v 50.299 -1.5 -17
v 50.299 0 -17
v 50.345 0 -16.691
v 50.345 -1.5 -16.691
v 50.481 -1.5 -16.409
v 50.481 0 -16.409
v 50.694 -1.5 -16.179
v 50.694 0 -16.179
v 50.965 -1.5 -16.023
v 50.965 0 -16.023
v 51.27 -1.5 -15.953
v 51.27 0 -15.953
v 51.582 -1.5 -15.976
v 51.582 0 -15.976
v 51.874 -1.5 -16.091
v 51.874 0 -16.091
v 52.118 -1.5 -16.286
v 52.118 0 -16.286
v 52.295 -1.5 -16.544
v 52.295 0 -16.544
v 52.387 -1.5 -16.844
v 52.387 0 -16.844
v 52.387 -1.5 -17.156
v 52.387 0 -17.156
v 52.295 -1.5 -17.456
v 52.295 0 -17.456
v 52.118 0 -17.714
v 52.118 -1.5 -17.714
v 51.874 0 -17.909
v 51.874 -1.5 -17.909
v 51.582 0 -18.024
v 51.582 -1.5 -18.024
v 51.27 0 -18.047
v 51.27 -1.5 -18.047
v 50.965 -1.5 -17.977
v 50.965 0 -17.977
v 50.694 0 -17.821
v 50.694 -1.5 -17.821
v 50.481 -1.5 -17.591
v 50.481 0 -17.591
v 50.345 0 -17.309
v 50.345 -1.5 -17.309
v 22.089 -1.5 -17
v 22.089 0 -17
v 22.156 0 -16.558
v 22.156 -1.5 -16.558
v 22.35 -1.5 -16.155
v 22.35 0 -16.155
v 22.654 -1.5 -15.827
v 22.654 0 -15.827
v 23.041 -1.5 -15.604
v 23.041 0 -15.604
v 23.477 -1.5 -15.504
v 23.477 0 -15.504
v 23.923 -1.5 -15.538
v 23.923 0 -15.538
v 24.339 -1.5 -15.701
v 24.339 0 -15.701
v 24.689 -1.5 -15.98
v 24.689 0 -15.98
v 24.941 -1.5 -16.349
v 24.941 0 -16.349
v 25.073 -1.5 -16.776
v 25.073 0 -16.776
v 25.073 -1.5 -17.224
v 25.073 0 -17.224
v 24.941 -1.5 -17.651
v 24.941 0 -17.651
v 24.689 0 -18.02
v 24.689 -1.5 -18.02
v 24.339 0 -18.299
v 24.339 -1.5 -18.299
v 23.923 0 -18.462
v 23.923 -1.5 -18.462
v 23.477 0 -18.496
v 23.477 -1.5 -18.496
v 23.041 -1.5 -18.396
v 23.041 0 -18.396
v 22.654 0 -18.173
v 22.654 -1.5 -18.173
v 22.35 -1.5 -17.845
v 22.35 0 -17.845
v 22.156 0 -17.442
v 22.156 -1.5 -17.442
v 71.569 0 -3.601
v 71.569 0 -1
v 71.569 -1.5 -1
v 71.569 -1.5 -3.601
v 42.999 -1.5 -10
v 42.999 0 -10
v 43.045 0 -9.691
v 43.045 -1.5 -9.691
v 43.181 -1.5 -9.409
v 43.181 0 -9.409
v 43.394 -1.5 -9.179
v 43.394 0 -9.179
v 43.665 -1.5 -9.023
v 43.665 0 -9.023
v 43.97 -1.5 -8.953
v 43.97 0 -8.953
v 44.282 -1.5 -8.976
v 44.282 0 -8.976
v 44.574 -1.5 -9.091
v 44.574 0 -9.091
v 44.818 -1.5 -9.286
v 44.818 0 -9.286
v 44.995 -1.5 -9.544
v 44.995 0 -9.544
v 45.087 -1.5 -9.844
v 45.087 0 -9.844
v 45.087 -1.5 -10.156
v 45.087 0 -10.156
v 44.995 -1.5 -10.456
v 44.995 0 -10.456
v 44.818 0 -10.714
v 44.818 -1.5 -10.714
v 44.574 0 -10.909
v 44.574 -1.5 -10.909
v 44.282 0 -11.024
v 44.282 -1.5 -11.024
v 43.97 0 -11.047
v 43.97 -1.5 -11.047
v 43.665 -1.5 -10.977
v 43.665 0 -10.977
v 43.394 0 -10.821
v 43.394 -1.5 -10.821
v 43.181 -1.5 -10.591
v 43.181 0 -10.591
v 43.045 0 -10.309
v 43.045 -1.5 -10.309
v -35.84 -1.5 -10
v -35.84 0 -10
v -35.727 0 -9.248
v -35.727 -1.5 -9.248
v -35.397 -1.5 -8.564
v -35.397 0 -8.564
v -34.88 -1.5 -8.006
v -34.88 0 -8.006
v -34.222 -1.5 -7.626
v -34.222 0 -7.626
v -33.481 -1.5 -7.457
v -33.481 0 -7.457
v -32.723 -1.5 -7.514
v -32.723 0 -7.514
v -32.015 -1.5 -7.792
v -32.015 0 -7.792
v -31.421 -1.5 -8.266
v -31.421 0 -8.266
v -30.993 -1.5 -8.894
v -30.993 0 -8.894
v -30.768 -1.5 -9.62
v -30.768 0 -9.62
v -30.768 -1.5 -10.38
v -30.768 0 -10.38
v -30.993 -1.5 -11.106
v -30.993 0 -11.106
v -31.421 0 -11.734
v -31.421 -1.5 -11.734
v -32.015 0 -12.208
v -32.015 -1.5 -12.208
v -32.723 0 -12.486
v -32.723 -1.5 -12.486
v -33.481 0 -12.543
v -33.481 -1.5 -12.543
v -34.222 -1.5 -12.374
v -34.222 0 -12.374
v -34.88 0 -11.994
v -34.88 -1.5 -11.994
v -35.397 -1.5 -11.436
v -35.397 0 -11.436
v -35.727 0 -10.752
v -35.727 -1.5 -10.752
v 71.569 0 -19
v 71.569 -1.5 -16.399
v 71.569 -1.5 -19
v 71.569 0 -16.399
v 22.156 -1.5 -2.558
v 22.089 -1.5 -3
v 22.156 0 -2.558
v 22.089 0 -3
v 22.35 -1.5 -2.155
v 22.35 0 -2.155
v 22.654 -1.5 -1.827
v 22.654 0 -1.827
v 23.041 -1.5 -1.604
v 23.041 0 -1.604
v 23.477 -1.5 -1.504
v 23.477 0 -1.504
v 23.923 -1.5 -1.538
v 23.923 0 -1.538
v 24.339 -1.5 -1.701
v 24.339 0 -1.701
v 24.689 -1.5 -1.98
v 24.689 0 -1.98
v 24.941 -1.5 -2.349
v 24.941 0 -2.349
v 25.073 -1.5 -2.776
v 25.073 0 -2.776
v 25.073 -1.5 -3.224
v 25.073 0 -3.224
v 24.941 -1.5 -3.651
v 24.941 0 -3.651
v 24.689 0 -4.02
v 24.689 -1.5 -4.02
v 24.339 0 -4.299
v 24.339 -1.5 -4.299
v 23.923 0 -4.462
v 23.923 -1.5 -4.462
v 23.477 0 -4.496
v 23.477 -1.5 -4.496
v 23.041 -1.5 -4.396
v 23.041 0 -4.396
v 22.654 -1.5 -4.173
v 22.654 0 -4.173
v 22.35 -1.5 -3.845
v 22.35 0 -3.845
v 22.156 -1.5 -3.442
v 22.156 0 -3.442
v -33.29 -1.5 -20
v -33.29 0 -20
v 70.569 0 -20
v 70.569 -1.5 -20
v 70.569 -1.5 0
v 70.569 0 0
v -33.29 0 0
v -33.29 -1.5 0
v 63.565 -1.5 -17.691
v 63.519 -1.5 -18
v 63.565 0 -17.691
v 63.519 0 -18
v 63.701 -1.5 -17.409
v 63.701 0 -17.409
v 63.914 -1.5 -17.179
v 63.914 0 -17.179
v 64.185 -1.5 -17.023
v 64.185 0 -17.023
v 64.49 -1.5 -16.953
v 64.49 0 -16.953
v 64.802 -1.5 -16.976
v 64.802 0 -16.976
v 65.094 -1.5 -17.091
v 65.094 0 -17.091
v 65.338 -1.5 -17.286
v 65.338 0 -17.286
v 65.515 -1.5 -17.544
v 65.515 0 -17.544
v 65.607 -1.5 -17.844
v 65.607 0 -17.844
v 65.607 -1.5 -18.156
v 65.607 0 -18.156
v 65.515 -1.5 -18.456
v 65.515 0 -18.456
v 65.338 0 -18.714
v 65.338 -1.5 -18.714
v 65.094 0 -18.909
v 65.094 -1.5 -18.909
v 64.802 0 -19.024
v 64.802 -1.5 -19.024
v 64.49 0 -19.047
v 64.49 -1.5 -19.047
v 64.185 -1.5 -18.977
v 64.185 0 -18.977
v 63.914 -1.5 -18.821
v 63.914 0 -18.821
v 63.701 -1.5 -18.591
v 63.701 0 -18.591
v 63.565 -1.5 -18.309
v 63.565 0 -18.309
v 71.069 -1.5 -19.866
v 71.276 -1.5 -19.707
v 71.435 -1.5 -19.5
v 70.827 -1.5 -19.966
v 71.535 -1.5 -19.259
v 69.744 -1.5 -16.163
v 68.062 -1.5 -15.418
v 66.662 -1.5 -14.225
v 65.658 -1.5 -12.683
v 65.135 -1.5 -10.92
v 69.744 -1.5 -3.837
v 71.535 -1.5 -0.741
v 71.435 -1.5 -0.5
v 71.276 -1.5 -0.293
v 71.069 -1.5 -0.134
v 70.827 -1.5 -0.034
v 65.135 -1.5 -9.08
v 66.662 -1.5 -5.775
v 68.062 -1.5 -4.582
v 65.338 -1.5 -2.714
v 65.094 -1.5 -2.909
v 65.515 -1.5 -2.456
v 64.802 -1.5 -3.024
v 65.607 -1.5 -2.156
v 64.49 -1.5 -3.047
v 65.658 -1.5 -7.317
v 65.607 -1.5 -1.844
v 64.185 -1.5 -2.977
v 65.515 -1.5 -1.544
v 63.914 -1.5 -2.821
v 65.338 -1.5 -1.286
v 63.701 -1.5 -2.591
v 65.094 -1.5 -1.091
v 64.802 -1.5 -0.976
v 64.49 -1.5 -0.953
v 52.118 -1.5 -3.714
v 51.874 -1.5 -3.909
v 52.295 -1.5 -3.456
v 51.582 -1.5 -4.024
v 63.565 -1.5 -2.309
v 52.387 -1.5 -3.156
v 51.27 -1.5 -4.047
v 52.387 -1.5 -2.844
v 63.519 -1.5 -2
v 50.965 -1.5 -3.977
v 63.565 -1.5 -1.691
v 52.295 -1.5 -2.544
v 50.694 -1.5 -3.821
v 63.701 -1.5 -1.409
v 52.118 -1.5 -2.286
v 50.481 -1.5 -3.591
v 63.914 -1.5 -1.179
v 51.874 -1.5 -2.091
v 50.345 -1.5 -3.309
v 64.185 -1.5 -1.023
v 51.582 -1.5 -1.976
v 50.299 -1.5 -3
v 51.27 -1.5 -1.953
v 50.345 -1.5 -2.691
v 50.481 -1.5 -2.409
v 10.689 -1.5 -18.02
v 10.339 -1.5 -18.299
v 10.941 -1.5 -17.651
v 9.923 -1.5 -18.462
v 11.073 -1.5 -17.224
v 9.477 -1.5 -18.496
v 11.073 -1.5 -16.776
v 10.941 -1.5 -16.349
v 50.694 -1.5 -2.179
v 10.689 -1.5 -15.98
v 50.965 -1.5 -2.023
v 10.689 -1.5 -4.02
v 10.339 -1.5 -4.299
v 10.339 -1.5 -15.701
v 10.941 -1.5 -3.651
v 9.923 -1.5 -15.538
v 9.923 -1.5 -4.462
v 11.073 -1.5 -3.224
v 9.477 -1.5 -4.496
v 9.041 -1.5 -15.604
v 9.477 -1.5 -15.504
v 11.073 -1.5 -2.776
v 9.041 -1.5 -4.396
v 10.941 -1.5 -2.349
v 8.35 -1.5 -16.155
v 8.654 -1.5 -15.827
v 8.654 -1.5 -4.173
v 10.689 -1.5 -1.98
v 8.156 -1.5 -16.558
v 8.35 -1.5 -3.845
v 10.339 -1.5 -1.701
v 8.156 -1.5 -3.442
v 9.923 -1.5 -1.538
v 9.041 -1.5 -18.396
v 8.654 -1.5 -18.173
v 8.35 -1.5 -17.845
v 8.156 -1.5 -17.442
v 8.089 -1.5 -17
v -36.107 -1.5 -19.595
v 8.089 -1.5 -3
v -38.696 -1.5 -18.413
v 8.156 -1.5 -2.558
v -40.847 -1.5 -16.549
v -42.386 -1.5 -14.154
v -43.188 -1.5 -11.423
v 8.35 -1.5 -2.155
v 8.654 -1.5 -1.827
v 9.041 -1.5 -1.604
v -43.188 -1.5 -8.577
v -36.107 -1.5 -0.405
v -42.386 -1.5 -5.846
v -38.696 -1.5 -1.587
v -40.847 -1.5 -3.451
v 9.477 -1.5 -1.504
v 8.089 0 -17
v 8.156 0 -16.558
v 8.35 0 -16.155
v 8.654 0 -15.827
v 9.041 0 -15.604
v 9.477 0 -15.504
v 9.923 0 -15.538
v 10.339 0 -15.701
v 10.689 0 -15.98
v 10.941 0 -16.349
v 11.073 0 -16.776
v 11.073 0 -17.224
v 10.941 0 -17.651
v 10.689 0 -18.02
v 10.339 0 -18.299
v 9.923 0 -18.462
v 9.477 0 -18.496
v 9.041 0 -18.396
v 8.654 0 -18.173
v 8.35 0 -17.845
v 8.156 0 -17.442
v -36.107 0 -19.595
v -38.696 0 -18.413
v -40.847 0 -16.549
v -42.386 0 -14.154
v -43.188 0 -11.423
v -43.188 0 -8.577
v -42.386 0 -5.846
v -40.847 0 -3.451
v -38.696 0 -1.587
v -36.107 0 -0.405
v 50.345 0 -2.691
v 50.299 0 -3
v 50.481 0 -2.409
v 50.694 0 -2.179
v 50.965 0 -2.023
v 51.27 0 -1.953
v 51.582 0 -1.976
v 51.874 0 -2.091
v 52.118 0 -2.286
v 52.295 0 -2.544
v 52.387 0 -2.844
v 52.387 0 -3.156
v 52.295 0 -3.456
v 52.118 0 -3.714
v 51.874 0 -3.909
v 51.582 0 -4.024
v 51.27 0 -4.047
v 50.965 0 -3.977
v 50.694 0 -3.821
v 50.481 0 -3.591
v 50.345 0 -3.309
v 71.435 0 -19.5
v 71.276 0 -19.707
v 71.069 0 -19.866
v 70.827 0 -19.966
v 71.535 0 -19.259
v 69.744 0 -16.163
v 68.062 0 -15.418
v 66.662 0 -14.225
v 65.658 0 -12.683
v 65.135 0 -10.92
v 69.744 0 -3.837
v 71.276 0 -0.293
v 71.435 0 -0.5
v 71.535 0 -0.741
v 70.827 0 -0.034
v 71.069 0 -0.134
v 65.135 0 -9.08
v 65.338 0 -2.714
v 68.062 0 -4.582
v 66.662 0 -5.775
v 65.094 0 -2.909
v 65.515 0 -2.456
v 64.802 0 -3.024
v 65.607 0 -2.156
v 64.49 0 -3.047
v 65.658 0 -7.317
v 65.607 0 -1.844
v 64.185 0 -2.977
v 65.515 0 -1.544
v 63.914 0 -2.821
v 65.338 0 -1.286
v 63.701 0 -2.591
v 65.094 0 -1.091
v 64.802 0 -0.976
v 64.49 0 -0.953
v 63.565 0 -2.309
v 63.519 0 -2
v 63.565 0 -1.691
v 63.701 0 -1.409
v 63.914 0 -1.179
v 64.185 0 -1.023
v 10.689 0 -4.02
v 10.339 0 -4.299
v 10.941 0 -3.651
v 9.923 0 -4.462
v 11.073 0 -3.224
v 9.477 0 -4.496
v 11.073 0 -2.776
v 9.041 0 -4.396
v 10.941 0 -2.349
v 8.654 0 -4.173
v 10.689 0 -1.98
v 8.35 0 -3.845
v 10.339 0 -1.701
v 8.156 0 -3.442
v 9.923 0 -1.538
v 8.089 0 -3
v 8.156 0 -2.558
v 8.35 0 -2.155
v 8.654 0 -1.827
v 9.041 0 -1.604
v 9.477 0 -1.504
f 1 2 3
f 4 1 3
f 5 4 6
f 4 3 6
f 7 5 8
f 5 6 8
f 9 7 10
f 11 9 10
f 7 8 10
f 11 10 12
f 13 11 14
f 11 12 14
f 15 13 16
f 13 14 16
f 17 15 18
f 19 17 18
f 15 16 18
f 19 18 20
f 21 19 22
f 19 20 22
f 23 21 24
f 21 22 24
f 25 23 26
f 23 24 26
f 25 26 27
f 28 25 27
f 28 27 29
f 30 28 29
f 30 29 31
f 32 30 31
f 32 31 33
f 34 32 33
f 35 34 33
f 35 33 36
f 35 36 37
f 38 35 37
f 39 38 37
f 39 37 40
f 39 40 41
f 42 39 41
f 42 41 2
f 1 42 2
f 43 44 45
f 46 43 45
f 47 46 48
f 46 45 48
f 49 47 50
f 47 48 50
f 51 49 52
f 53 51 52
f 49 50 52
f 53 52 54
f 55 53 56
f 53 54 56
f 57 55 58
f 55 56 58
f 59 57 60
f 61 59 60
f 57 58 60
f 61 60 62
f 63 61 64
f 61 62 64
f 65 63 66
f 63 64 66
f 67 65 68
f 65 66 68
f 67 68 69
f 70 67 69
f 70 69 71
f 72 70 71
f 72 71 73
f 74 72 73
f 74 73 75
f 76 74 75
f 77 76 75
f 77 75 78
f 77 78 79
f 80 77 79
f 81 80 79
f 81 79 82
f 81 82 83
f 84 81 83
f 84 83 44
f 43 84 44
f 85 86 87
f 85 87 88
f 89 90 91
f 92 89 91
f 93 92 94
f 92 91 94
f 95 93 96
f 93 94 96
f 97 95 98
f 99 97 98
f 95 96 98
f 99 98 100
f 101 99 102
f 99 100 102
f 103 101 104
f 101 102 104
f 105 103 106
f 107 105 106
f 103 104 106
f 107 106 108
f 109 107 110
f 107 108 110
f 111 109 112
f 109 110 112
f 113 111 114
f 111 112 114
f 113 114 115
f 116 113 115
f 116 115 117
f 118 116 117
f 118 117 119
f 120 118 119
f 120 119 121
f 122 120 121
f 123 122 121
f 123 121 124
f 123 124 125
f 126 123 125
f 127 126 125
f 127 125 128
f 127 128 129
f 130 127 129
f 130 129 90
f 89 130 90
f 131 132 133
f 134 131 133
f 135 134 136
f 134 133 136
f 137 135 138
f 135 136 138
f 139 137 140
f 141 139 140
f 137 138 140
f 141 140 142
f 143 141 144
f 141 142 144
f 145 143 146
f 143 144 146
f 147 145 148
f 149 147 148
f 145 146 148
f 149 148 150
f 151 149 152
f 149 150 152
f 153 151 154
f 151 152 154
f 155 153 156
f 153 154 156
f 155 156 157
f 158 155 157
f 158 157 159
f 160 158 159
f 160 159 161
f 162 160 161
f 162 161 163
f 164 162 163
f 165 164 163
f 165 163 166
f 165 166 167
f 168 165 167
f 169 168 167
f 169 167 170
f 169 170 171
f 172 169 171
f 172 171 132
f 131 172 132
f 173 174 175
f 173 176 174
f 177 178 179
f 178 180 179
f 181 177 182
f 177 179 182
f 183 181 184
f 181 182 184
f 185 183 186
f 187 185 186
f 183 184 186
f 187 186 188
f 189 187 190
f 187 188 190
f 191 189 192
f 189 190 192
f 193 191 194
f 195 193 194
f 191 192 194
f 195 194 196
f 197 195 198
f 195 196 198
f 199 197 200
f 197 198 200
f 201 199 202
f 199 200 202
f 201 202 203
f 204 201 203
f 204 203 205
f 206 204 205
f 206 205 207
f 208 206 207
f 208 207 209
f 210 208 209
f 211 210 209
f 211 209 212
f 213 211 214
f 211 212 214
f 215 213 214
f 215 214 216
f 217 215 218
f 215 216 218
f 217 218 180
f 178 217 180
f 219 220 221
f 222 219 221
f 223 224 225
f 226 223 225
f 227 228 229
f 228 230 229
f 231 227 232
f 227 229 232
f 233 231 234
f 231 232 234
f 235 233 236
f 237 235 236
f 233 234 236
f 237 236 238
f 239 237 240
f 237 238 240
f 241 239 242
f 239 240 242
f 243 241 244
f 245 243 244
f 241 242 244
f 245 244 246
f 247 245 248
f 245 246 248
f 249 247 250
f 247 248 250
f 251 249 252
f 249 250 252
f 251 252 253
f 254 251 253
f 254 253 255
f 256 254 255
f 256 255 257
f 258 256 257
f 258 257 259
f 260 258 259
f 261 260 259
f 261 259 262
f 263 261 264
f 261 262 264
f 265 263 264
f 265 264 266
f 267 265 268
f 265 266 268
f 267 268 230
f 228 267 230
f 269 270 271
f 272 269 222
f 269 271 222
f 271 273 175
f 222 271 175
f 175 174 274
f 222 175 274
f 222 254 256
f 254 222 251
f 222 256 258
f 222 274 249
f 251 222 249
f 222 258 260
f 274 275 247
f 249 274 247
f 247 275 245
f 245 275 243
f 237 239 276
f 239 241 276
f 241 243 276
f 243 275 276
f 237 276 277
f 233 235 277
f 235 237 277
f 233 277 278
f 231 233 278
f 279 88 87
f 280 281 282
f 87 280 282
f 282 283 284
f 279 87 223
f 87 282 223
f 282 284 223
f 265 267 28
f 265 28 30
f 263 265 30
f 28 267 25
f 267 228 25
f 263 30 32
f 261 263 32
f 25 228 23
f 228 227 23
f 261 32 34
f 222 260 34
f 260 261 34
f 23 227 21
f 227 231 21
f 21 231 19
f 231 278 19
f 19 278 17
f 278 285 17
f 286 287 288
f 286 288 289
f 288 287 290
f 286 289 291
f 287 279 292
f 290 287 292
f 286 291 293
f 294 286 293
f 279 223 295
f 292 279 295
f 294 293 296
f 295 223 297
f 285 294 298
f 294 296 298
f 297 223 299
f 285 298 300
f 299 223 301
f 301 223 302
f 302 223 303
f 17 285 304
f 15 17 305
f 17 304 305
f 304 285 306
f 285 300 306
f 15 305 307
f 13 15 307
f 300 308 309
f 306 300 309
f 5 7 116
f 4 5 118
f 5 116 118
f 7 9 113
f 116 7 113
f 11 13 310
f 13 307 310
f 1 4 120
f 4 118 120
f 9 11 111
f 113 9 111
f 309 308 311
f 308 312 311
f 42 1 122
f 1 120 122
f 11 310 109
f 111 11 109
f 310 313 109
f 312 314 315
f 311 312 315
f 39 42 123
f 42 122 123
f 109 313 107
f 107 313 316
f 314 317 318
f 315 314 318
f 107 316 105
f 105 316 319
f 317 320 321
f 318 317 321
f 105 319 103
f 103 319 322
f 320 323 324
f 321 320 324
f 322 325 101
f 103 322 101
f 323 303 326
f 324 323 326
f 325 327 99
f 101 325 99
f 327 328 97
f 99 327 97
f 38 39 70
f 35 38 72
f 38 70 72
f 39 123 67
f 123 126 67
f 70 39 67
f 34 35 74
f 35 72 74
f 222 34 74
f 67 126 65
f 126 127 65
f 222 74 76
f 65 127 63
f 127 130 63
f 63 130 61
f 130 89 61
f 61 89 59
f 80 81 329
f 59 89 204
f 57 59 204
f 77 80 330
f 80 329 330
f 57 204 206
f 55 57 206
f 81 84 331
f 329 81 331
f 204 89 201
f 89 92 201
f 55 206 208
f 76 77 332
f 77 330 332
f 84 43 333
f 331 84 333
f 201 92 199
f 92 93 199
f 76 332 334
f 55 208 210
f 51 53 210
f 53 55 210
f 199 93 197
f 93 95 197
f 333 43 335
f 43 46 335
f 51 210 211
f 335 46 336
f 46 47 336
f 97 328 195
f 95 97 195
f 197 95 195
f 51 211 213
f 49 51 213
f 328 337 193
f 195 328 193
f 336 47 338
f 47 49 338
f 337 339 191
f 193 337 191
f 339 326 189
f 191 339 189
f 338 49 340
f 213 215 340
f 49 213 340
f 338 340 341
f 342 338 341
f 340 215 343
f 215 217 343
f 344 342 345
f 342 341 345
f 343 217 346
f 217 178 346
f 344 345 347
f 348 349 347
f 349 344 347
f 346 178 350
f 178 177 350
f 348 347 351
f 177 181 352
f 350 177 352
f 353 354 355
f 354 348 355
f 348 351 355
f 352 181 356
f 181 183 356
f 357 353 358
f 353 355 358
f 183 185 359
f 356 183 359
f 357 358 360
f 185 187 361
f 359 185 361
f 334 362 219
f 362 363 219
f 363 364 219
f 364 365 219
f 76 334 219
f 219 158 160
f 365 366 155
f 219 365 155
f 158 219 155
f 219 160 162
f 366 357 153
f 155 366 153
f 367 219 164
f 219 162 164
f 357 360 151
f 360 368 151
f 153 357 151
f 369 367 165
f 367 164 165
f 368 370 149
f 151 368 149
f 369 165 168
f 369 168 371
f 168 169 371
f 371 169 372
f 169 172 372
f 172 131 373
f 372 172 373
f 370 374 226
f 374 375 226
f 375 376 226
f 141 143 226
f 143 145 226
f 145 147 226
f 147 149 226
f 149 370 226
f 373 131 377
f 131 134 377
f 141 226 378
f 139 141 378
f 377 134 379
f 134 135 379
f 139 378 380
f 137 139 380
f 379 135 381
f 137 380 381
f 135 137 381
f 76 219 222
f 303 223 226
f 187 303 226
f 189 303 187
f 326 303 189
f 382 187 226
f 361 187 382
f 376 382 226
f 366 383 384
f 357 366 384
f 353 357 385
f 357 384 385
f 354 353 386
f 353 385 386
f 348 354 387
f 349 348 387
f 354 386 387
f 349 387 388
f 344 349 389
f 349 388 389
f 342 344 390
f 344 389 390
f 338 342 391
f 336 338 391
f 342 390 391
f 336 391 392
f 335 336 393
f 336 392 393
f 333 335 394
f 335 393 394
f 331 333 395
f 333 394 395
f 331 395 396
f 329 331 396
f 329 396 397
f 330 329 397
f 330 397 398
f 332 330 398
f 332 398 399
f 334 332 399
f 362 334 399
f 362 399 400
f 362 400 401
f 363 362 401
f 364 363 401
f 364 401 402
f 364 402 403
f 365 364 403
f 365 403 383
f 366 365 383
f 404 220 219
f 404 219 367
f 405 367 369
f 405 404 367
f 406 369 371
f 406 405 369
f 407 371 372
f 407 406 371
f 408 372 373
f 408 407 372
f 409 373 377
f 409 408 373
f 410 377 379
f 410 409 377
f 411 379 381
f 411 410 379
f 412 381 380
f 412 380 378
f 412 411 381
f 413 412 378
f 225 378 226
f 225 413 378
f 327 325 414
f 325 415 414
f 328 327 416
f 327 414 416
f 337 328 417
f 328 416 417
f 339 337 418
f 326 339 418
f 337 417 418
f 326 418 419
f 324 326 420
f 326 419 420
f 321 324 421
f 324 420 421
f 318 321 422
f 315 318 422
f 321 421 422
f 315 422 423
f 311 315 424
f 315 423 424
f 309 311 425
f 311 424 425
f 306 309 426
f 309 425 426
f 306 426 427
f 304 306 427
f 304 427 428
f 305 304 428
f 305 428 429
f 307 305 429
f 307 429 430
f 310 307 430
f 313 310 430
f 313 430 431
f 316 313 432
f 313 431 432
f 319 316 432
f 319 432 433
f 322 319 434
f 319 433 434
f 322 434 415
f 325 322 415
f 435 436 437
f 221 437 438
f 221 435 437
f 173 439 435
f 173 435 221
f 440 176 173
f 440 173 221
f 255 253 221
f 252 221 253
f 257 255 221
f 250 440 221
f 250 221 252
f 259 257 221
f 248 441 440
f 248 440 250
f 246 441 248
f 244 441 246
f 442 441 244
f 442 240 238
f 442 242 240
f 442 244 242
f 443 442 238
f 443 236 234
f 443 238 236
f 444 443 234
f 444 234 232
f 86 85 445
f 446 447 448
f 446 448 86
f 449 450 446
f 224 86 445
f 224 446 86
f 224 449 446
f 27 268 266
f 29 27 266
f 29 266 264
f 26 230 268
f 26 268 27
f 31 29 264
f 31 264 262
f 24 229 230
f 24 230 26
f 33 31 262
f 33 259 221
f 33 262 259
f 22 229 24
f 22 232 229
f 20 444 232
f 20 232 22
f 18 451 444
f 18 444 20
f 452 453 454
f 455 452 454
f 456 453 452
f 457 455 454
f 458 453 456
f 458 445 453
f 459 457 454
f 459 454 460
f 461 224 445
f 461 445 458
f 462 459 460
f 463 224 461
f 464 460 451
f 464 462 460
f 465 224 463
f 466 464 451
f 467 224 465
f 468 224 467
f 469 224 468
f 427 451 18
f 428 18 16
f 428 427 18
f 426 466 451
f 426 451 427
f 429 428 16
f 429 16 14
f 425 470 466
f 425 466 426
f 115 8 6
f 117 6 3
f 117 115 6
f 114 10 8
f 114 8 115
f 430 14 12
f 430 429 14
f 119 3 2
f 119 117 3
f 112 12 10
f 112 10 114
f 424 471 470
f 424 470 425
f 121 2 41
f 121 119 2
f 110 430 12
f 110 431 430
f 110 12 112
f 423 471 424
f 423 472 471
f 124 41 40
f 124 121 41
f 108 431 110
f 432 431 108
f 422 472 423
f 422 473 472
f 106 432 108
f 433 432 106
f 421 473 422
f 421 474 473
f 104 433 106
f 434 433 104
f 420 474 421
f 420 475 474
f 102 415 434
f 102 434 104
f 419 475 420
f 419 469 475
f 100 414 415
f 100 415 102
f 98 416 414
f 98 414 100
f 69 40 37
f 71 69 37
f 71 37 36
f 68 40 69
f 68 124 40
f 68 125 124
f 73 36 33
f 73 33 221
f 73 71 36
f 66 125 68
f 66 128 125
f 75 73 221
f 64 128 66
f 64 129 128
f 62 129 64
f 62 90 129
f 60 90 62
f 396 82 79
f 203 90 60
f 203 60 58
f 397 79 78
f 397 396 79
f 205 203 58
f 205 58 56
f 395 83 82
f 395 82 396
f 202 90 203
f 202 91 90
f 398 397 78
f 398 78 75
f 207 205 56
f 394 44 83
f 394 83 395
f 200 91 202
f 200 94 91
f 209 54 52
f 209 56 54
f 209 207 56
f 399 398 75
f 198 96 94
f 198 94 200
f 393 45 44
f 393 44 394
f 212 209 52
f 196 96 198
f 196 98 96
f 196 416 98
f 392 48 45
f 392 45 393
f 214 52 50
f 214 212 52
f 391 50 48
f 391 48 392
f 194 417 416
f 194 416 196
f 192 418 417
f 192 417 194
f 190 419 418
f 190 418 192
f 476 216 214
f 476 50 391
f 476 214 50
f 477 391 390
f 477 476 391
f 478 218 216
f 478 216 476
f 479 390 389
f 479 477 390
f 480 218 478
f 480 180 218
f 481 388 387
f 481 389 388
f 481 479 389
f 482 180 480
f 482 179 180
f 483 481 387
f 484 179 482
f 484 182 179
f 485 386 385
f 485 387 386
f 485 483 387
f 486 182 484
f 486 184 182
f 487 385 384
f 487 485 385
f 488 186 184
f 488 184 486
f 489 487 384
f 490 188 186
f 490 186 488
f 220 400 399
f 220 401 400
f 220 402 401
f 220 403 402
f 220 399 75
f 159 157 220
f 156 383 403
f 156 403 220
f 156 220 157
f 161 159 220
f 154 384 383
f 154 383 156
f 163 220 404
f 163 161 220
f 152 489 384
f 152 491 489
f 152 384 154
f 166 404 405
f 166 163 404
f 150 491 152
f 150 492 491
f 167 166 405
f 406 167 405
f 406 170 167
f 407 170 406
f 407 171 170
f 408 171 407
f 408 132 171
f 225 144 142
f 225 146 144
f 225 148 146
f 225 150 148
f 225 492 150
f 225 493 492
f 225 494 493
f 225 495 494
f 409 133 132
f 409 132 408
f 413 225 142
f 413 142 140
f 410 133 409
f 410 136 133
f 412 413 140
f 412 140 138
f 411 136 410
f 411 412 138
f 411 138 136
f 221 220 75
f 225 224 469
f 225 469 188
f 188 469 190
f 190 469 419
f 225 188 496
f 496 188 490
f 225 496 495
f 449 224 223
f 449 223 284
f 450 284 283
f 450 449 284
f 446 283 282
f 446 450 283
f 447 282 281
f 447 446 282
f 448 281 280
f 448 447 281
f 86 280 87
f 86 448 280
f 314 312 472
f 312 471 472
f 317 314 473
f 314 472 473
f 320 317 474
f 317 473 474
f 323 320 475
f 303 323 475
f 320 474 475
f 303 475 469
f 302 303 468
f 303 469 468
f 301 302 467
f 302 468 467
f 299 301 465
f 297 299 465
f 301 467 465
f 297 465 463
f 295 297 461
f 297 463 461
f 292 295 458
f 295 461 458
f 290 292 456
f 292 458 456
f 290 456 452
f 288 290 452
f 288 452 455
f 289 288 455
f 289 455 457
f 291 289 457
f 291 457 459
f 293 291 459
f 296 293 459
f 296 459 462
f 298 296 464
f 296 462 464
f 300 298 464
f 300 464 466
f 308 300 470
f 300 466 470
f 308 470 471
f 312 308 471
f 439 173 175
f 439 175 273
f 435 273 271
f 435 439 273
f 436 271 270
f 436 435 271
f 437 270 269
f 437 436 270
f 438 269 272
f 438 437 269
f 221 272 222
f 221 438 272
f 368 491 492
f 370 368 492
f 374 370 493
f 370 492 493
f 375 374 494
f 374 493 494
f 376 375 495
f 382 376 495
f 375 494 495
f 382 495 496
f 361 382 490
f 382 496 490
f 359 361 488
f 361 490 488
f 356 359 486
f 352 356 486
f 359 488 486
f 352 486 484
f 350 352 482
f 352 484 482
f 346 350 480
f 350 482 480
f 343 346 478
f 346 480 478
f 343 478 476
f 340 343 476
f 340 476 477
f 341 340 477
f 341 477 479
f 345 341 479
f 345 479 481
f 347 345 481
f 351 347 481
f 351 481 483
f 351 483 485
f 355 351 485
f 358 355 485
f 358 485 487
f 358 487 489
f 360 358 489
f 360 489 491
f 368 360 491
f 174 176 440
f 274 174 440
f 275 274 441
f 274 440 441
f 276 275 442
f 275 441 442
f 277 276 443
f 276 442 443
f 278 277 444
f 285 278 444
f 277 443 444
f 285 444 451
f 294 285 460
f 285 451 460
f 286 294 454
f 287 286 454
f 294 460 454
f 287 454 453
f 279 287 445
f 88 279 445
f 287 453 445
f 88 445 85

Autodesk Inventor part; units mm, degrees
ref_plane "YZ Plane" through (0, 0, 0) normal (1, 0, 0) x (0, 1, 0)
ref_plane "XZ Plane" through (0, 0, 0) normal (0, 1, 0) x (-1, 0, 0)
ref_plane "XY Plane" through (0, 0, 0) normal (0, 0, 1) x (1, 0, 0)
sketch "Sketch1" plane through (0, 0, 0) normal (0, 1, 0) x (-1, 0, 0)
  line L0 (-37.7289, 0) -> (-37.7289, -20)
  line L1 (-0.4496, -20) -> (-0.4496, 0)
  circle A0 centre (-64.5686, -18) radius 1.05
  circle A1 centre (-51.3486, -17) radius 1.05
  circle A2 centre (-44.0486, -10) radius 1.05
  circle A3 centre (-51.3486, -3) radius 1.05
  circle A4 centre (-64.5686, -2) radius 1.05
  circle A5 centre (-23.5893, -3) radius 1.5
  circle A6 centre (-9.5893, -3) radius 1.5
  circle A7 centre (-23.5893, -17) radius 1.5
  circle A8 centre (-9.5893, -17) radius 1.5
  circle A9 centre (33.29, -10) radius 2.55
  arc A10 (-70.5686, 0) -> (-71.5686, -1) centre (-70.5686, -1) ccw
  line L2 (-71.5686, -1) -> (-71.5686, -3.6008)
  arc A11 (-71.5686, -19) -> (-70.5686, -20) centre (-70.5686, -19) ccw
  line L3 (-71.5686, -16.3992) -> (-71.5686, -19)
  arc A12 (-71.5686, -16.3992) -> (-71.5686, -3.6008) centre (-71.4686, -10) ccw
  line L4 (-70.5686, 0) -> (33.29, 0)
  line L5 (33.29, -20) -> (-70.5686, -20)
  arc A13 (33.29, -20) -> (33.29, 0) centre (33.29, -10) ccw
  line L6 (-38.1786, -20) -> (-38.1786, 0)
  line L7 (-37.2793, 0) -> (-37.2793, -20)
  line L8 (-0.8993, -20) -> (-0.8993, 0)
  line L9 (0, 0) -> (0, -20)
  point P0 (0, 0)
extrude "Extrusion1" add sketch "Sketch1" against normal blind 1.5
properties part number "CAM_axis_3_bottom_frame"
